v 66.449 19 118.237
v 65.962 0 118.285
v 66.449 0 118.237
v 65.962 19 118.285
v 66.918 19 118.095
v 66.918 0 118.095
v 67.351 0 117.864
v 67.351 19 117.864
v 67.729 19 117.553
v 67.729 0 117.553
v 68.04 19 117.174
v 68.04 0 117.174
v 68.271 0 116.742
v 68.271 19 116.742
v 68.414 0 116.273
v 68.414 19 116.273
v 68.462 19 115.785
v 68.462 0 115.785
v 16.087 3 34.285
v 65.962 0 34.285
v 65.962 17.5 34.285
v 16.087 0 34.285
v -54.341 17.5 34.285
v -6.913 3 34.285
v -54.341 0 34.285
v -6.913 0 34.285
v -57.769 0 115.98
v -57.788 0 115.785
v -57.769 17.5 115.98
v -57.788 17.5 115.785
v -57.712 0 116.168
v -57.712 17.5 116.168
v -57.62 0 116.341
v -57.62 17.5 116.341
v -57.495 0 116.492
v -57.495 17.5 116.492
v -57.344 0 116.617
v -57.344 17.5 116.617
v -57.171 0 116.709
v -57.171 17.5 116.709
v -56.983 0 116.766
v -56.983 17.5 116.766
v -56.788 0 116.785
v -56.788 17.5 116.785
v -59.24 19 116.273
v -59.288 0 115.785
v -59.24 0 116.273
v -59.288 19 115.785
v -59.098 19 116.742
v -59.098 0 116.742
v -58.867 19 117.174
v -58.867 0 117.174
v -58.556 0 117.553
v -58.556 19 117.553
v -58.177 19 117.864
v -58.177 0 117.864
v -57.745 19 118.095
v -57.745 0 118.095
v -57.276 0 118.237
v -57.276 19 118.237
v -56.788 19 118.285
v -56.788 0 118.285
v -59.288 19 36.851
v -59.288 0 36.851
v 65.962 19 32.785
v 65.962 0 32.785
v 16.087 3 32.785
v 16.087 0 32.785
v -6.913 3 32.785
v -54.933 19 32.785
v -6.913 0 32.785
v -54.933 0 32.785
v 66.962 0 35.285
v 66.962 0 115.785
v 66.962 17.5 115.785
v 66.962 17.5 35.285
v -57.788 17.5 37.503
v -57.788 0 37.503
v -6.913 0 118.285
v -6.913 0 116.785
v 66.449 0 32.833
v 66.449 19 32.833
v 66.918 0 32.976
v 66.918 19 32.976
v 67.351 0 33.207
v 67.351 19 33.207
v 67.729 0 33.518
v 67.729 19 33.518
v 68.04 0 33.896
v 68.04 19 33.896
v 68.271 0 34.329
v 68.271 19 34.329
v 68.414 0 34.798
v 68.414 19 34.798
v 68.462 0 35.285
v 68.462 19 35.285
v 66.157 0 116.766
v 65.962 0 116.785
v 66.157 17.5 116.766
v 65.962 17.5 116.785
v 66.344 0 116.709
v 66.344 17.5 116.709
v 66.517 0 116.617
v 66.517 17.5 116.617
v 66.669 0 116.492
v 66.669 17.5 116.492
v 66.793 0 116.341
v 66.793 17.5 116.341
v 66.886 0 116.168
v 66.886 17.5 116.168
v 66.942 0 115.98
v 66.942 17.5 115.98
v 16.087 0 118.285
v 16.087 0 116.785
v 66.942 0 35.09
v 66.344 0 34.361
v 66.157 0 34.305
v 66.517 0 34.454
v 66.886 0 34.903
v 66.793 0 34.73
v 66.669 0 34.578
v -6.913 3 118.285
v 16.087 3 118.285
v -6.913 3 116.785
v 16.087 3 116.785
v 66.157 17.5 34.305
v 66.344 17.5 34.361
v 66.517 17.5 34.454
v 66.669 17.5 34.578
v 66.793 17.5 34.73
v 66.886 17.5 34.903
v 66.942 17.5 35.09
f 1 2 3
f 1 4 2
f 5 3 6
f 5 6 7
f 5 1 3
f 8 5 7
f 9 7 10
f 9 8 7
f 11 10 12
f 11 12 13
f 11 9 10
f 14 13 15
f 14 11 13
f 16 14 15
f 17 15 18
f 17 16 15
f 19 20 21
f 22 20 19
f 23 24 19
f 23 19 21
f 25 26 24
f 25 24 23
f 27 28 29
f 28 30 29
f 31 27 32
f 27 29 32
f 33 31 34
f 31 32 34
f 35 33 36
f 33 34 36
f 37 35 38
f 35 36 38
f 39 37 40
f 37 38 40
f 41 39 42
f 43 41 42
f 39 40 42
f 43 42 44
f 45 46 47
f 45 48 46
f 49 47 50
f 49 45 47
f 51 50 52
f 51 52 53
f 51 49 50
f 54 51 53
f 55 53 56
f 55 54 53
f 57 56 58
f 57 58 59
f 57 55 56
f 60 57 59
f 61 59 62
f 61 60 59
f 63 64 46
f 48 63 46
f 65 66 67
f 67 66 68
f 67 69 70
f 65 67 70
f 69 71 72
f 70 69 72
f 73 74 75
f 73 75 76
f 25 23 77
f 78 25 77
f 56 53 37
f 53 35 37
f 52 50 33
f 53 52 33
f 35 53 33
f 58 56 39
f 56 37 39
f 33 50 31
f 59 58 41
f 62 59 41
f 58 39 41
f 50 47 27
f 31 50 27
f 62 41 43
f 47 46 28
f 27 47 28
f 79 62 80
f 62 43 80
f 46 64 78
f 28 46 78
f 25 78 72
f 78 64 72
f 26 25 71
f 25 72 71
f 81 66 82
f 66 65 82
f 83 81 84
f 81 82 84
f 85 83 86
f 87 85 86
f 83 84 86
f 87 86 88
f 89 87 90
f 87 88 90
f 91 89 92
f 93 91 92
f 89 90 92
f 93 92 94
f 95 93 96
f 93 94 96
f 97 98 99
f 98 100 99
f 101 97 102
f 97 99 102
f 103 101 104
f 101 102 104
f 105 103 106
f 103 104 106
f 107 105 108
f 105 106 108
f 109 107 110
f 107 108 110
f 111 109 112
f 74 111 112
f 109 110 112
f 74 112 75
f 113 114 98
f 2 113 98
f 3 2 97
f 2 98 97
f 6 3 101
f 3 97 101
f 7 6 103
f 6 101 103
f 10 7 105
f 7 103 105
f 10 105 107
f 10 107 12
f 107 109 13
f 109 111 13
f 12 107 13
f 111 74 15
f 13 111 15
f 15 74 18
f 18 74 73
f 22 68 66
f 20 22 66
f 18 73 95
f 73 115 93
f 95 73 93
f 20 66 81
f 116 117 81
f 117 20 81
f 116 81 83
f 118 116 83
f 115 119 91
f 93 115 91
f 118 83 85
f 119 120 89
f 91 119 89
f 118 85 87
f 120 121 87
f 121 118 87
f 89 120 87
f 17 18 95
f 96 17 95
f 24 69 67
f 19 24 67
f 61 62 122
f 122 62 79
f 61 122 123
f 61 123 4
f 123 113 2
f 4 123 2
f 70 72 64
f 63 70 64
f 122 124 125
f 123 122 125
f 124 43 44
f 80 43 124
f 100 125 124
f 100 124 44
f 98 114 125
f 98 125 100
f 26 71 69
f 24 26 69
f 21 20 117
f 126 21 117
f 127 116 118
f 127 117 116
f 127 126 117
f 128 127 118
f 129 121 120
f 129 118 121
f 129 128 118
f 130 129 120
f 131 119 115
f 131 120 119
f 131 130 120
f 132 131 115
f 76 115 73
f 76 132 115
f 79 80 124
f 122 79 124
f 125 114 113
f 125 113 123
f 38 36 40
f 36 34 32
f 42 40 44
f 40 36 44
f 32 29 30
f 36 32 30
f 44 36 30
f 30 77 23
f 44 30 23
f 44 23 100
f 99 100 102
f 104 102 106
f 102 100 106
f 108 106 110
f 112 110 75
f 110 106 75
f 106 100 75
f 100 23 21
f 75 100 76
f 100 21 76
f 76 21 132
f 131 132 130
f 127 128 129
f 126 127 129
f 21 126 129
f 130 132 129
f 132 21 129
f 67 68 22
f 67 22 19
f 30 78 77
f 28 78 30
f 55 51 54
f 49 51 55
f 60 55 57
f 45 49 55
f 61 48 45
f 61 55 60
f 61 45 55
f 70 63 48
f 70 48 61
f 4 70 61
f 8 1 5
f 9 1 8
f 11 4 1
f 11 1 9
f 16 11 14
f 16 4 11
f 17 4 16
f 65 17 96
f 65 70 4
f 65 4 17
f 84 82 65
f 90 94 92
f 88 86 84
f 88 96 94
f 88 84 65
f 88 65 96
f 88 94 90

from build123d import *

# Parameters (mm, degrees)
BOSS_EXTRUDE1_DEPTH     = 19
FILLET1_R               = 2.5
SHELL1_T                = -1.5
SKETCH4_W               = 23
SKETCH4_H               = 3
CUT_EXTRUDE1_DEPTH      = 119.285320442
CUT_EXTRUDE1_DEPTH_BACK = 1


with BuildPart() as part:
    # Sketch3 → Boss-Extrude1 (new body)
    with BuildSketch(Plane(origin=(0, 0, 0), x_dir=(1, 0, 0), z_dir=(0, 1, 0))):
        Polygon((68.461632103, -32.785320442), (-54.932531078, -32.785320442), (-59.288367897, -36.85076814), (-59.288367897, -118.285320442), (68.461632103, -118.285320442), align=None)
    extrude(amount=BOSS_EXTRUDE1_DEPTH)

    # Fillet1
    fillet1_edges = [part.edges().sort_by_distance(p)[0] for p in [
        (68.461632103, 9.5, 32.785320442),
        (68.461632103, 9.5, 118.285320442),
        (-59.288367897, 9.5, 118.285320442),
    ]]
    fillet(fillet1_edges, radius=FILLET1_R)

    # Shell1
    shell1_openings = [part.faces().sort_by_distance(p)[0] for p in [
        (4.883332574, 0, 75.795722274),
    ]]
    offset(amount=SHELL1_T, openings=shell1_openings, kind=Kind.INTERSECTION)

    # Sketch4 → Cut-Extrude1 (cut, two sides)
    with BuildSketch(Plane.XY) as cut_extrude1_sk:
        with Locations((4.586632103, 1.5)):
            Rectangle(SKETCH4_W, SKETCH4_H)
    extrude(amount=CUT_EXTRUDE1_DEPTH, mode=Mode.SUBTRACT)
    extrude(cut_extrude1_sk.sketch, amount=-CUT_EXTRUDE1_DEPTH_BACK, mode=Mode.SUBTRACT)


solid = part.part
